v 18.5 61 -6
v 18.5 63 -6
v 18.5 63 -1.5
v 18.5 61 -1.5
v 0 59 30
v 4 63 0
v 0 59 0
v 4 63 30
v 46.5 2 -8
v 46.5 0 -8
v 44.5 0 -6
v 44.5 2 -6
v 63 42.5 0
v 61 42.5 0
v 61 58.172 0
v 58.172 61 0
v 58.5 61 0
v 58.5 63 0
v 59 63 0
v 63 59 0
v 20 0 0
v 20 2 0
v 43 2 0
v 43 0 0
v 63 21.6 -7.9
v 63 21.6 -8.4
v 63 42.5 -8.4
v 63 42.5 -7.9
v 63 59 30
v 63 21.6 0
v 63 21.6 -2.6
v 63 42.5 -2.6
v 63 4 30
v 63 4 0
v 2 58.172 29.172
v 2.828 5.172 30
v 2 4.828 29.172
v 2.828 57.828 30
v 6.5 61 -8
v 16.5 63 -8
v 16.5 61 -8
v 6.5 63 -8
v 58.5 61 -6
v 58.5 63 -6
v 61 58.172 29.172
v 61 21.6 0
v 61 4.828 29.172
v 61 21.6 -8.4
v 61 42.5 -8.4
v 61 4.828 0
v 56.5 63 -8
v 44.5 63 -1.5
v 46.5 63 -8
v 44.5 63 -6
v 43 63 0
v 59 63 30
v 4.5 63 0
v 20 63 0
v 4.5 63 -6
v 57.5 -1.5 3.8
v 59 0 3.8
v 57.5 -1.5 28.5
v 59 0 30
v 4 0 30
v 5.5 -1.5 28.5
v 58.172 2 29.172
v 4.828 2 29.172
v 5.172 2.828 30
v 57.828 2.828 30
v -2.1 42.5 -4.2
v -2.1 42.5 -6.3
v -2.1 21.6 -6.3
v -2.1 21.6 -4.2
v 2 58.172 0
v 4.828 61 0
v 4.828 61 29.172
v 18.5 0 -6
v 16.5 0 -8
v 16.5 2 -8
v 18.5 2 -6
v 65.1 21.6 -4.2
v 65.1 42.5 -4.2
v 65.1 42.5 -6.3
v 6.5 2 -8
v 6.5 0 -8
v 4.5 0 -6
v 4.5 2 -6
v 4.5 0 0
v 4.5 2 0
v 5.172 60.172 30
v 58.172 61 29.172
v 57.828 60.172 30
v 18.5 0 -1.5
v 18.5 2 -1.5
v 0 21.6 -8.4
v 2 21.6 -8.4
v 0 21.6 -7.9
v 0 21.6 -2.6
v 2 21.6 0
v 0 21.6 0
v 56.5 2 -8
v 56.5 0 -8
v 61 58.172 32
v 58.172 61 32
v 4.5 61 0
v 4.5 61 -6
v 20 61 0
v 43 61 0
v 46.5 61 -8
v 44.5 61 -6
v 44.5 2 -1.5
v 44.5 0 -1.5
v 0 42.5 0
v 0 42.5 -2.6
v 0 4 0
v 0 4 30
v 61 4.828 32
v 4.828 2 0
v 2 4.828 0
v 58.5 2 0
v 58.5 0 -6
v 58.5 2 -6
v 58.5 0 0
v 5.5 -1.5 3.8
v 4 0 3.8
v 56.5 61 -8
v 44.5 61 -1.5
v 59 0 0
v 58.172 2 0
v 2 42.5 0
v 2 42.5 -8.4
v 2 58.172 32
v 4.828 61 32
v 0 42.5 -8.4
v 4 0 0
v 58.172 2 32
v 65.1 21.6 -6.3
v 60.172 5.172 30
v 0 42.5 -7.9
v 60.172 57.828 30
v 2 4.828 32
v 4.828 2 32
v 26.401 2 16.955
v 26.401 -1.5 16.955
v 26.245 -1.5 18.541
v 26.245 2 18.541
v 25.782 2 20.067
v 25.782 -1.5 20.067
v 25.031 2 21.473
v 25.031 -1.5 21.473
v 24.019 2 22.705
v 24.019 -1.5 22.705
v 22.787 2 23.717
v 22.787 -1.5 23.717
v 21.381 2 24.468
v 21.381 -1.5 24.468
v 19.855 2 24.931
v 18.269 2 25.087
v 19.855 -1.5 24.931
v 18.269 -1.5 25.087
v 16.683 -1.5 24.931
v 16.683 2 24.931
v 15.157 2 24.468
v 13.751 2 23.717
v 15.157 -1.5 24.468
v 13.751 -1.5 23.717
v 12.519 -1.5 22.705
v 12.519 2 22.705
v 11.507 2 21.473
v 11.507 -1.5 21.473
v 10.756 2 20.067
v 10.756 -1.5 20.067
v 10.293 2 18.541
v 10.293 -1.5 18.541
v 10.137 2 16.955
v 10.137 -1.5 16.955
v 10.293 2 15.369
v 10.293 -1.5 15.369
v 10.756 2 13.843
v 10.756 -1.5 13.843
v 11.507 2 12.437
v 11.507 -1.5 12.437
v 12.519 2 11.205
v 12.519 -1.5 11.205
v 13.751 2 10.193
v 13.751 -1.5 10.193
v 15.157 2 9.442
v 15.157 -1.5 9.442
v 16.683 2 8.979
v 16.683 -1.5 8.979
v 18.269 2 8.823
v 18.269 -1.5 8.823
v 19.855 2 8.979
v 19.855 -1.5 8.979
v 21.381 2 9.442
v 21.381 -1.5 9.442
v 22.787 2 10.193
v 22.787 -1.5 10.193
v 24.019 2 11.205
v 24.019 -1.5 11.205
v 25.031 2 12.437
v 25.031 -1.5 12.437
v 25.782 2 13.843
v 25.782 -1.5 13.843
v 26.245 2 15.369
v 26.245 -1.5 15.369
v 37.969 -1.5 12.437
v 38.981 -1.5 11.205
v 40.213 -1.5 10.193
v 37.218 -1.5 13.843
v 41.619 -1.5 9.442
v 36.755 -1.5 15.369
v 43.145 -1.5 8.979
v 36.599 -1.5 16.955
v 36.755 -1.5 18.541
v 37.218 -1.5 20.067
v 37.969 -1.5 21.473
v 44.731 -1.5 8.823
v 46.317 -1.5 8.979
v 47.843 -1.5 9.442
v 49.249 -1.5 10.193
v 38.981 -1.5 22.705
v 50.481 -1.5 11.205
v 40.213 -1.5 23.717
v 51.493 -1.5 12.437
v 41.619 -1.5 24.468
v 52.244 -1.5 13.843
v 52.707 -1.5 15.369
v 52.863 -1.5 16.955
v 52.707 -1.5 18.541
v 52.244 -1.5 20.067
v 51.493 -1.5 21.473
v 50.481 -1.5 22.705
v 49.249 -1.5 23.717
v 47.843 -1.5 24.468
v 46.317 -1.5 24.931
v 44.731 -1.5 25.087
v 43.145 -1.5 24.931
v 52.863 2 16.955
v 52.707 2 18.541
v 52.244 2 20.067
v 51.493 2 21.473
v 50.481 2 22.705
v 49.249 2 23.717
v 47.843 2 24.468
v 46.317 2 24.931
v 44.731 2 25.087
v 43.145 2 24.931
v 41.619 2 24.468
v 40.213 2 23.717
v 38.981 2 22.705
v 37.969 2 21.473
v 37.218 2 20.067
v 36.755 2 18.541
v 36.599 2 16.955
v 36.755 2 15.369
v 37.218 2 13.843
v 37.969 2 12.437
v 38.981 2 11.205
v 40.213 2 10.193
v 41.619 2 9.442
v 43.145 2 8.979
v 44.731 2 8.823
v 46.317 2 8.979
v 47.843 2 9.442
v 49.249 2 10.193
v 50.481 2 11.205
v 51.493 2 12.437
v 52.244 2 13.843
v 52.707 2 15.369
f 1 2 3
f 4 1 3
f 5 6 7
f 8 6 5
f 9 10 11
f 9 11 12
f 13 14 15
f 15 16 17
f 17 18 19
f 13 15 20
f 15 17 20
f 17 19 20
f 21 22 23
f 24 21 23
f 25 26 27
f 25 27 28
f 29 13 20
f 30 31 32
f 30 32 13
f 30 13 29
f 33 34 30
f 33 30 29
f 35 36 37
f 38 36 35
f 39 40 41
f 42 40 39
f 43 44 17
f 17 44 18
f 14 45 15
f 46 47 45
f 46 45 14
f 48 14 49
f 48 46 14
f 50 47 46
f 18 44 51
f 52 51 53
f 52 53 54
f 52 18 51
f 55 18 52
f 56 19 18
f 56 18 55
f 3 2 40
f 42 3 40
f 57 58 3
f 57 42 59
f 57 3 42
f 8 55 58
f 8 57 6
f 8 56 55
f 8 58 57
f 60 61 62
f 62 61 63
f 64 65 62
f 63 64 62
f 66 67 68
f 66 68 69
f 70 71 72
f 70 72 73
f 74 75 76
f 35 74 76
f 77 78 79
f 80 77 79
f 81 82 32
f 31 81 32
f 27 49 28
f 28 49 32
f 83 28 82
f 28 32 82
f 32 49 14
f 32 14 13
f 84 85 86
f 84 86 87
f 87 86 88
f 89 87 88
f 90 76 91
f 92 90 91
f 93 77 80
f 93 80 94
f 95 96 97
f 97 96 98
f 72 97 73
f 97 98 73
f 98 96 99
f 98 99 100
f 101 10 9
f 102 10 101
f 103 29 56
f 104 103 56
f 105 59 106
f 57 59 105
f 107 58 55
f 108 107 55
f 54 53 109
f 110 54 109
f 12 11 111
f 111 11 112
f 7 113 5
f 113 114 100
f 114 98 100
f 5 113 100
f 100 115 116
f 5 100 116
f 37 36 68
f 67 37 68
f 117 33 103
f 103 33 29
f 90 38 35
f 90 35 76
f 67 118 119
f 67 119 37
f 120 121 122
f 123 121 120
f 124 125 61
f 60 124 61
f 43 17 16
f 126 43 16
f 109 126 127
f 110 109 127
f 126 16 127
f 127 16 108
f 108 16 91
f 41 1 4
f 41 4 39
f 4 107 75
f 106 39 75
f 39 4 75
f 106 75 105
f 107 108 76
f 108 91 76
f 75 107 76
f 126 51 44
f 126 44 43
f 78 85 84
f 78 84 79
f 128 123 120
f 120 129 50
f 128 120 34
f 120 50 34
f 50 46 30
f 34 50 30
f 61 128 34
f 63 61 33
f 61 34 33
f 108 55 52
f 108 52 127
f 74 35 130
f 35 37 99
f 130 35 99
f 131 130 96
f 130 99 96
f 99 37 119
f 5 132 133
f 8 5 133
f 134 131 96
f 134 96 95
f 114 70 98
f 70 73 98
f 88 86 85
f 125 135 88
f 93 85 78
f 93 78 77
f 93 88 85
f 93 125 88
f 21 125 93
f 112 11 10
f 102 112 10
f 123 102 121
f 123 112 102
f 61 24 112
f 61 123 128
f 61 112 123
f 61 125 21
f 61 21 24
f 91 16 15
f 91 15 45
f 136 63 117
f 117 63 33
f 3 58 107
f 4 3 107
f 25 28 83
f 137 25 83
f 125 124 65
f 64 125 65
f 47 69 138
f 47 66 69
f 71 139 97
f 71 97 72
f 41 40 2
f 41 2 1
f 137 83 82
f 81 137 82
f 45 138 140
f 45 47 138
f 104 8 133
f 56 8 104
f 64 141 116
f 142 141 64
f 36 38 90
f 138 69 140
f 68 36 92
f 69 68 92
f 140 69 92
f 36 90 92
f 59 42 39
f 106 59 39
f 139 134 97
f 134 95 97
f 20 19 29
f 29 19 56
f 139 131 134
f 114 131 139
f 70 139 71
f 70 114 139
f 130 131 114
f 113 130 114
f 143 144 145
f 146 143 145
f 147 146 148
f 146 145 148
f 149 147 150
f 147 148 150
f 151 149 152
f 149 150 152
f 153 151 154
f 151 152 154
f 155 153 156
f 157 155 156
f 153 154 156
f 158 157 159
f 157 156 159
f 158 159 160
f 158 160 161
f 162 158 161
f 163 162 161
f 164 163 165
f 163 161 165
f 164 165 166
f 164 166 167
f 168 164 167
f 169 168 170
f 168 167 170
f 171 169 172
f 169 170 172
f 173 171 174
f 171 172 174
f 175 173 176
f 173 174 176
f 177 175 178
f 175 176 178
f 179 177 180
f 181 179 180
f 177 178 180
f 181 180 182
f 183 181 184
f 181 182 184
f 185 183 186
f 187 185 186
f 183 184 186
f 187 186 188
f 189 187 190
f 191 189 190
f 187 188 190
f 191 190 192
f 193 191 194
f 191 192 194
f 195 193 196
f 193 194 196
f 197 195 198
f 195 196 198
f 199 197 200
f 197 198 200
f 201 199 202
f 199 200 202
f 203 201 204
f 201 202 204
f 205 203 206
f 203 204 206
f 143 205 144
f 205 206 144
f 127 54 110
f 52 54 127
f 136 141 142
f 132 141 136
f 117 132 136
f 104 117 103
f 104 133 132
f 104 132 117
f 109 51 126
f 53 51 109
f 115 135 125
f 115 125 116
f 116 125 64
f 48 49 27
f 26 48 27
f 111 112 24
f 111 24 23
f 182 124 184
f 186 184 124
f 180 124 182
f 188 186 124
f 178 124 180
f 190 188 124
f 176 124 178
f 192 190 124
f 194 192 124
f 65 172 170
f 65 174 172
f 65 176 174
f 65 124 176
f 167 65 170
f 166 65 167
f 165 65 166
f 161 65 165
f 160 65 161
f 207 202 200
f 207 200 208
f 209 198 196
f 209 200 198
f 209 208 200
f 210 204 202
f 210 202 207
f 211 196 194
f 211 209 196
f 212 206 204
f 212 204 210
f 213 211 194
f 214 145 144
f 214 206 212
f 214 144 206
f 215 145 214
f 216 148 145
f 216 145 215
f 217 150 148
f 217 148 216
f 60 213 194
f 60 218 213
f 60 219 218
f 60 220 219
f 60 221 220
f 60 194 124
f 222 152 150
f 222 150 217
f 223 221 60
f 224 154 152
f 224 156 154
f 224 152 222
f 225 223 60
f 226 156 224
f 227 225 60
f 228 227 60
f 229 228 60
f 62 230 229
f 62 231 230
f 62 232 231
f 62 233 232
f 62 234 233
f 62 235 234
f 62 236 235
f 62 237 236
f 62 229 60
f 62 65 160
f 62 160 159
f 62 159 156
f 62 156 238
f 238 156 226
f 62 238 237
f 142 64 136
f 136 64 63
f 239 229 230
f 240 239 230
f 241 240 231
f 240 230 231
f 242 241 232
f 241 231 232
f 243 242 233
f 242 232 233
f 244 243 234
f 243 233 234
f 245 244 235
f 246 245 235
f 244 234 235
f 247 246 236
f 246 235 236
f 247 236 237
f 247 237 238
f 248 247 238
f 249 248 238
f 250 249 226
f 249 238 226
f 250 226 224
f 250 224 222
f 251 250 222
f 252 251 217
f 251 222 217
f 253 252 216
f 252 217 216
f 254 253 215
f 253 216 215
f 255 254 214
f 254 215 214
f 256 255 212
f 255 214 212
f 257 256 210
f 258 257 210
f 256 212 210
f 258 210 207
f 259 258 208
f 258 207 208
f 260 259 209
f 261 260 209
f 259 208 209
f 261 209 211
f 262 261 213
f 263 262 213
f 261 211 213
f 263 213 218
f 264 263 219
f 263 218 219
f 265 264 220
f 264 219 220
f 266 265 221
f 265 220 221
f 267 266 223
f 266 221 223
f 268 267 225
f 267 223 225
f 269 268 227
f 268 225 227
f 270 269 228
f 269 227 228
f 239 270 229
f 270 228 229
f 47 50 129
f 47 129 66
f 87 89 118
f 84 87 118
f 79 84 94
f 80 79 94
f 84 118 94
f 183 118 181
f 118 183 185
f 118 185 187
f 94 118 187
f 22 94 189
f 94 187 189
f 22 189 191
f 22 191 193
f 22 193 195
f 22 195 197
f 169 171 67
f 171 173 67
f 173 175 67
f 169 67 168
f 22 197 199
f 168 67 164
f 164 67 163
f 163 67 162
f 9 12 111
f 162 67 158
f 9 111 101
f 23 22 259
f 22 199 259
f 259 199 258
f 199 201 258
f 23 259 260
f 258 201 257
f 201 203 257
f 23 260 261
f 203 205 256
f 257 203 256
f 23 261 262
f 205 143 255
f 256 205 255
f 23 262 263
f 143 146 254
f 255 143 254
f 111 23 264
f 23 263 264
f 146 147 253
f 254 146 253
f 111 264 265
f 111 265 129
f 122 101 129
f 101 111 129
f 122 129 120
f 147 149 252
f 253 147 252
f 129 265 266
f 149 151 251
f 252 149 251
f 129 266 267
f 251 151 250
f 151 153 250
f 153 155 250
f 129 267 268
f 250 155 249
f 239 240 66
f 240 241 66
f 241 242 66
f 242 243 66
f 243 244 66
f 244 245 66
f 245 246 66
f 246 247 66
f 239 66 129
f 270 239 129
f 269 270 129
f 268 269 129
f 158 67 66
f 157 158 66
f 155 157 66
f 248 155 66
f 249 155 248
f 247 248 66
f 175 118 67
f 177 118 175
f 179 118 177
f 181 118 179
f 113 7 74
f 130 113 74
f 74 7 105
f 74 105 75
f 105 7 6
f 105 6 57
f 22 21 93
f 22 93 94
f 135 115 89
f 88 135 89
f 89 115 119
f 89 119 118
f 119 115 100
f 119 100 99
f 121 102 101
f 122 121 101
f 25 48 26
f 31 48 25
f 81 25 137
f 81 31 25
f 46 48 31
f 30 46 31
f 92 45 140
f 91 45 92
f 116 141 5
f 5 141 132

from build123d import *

# Parameters (mm, degrees)
F0_W      = 63
F0_H      = 63
F1_DEPTH  = 32
F2_SIZE   = 4
F3_SIZE   = 2
F4_T      = -2
F5_W      = 55
F5_H      = 26.2
F6_DEPTH  = 1.5
F7_SIZE   = 1.49999
F8_R      = 8.132
F9_DEPTH  = 3.5
F10_W     = 14
F10_H     = 8
F11_DEPTH = 2
F13_W     = 14
F13_H     = 8
F14_DEPTH = 2
F15_SIZE  = 2
F16_SIZE  = 1.5
F18_DEPTH = 9.9
F19_DEPTH = 11


# Not quite as in the source:
# - a fillet or chamfer is up to 0.001 mm smaller than in the source, because OpenCascade refuses the exact size
# - a pattern or mirror of a feature is missing from the dataset's text; its kind, count and spacing are read off the source's solid


with BuildPart() as f1:
    # F0 (on Top) → F1 (new body)
    with BuildSketch(Plane.XY):
        with Locations((31.5, 31.5)):
            Rectangle(F0_W, F0_H)
    extrude(amount=F1_DEPTH)

    # F2
    f2_edges = [f1.edges().sort_by_distance(p)[0] for p in [
        (63, 0, 16),
        (63, 63, 16),
        (0, 0, 16),
        (0, 63, 16),
    ]]
    chamfer(f2_edges, length=F2_SIZE)

    # F3
    f3_edges = [f1.edges().sort_by_distance(p)[0] for p in [
        (0, 31.5, 32),
        (2, 61, 32),
        (2, 2, 32),
        (31.5, 63, 32),
        (31.5, 0, 32),
        (61, 61, 32),
        (61, 2, 32),
        (63, 31.5, 32),
    ]]
    chamfer(f3_edges, length=F3_SIZE)

    # F4
    f4_openings = [f1.faces().sort_by_distance(p)[0] for p in [
        (31.5, 31.5, 0),
    ]]
    offset(amount=F4_T, openings=f4_openings)

    # F5 (on face) → F6 (join)
    with BuildSketch(Plane.XZ):
        with Locations((31.5, 16.9)):
            Rectangle(F5_W, F5_H)
    extrude(amount=F6_DEPTH)

    # F7 (size 1.5 in the source; OpenCascade refuses exactly that, so slightly less here)
    f7_edges = [f1.edges().sort_by_distance(p)[0] for p in [
        (31.5, -1.5, 30),
        (4, -1.5, 16.9),
        (59, -1.5, 16.9),
    ]]
    chamfer(f7_edges, length=F7_SIZE)

    # F8 (on face) → F9 (cut, through all)
    with BuildSketch(Plane.XZ.offset(1.5)):
        with Locations((18.269, 16.955)):
            Circle(F8_R)
        with Locations((44.731, 16.955)):
            Circle(F8_R)
    extrude(amount=-F9_DEPTH, mode=Mode.SUBTRACT)

    # F10 (on face) → F11 (join, through all)
    with BuildSketch(Plane.XZ):
        with Locations((11.5, -4)):
            Rectangle(F10_W, F10_H)
        with Locations((51.5, -4)):
            Rectangle(F10_W, F10_H)
    extrude(amount=-F11_DEPTH)

    # F13 (on face) → F14 (join)
    with BuildSketch(Plane(origin=(0, 63, 0), x_dir=(-1, 0, 0), z_dir=(0, 1, 0))):
        with Locations((-51.5, -4)):
            Rectangle(F13_W, F13_H)
        with Locations((-11.5, -4)):
            Rectangle(F13_W, F13_H)
    extrude(amount=-F14_DEPTH)

    # F15
    f15_edges = [f1.edges().sort_by_distance(p)[0] for p in [
        (4.5, 1, -8),
        (18.5, 1, -8),
        (44.5, 1, -8),
        (58.5, 1, -8),
        (18.5, 62, -8),
        (4.5, 62, -8),
        (58.5, 62, -8),
        (44.5, 62, -8),
    ]]
    chamfer(f15_edges, length=F15_SIZE)

    # F16
    f16_edges = [f1.edges().sort_by_distance(p)[0] for p in [
        (18.5, 62, 0),
        (18.5, 1, 0),
        (44.5, 1, 0),
        (44.5, 62, 0),
    ]]
    chamfer(f16_edges, length=F16_SIZE)

    # F17 (on mid) → F18 (join)
    with BuildSketch(Plane(origin=(0, 31.5, 0), x_dir=(-1, 0, 0), z_dir=(0, 1, 0))):
        Polygon((0, -2.6), (0, 0), (-2, 0), (-2, -8.4), (0, -8.4), (0, -7.9), align=None)
        Polygon((2.1, -4.2), (0, -2.6), (0, -7.9), (2.1, -6.3), align=None)
    f18 = extrude(amount=-F18_DEPTH)

    # F18_copies: F18 across plane
    add(f18.mirror(Plane(origin=(31.5, 0, 0), x_dir=(0, 0, 1), z_dir=(1, 0, 0))))

    # F19 (add): a face of the model
    f19_faces = [f1.faces().sort_by_distance(p)[0] for p in [
        (0.3995726496, 31.5, -4.5320512821),
    ]]
    f19 = extrude(f19_faces, amount=F19_DEPTH)

    # F19_copies: F19 across plane
    add(f19.mirror(Plane(origin=(31.5, 0, 0), x_dir=(0, 0, 1), z_dir=(1, 0, 0))))


solid = f1.part
